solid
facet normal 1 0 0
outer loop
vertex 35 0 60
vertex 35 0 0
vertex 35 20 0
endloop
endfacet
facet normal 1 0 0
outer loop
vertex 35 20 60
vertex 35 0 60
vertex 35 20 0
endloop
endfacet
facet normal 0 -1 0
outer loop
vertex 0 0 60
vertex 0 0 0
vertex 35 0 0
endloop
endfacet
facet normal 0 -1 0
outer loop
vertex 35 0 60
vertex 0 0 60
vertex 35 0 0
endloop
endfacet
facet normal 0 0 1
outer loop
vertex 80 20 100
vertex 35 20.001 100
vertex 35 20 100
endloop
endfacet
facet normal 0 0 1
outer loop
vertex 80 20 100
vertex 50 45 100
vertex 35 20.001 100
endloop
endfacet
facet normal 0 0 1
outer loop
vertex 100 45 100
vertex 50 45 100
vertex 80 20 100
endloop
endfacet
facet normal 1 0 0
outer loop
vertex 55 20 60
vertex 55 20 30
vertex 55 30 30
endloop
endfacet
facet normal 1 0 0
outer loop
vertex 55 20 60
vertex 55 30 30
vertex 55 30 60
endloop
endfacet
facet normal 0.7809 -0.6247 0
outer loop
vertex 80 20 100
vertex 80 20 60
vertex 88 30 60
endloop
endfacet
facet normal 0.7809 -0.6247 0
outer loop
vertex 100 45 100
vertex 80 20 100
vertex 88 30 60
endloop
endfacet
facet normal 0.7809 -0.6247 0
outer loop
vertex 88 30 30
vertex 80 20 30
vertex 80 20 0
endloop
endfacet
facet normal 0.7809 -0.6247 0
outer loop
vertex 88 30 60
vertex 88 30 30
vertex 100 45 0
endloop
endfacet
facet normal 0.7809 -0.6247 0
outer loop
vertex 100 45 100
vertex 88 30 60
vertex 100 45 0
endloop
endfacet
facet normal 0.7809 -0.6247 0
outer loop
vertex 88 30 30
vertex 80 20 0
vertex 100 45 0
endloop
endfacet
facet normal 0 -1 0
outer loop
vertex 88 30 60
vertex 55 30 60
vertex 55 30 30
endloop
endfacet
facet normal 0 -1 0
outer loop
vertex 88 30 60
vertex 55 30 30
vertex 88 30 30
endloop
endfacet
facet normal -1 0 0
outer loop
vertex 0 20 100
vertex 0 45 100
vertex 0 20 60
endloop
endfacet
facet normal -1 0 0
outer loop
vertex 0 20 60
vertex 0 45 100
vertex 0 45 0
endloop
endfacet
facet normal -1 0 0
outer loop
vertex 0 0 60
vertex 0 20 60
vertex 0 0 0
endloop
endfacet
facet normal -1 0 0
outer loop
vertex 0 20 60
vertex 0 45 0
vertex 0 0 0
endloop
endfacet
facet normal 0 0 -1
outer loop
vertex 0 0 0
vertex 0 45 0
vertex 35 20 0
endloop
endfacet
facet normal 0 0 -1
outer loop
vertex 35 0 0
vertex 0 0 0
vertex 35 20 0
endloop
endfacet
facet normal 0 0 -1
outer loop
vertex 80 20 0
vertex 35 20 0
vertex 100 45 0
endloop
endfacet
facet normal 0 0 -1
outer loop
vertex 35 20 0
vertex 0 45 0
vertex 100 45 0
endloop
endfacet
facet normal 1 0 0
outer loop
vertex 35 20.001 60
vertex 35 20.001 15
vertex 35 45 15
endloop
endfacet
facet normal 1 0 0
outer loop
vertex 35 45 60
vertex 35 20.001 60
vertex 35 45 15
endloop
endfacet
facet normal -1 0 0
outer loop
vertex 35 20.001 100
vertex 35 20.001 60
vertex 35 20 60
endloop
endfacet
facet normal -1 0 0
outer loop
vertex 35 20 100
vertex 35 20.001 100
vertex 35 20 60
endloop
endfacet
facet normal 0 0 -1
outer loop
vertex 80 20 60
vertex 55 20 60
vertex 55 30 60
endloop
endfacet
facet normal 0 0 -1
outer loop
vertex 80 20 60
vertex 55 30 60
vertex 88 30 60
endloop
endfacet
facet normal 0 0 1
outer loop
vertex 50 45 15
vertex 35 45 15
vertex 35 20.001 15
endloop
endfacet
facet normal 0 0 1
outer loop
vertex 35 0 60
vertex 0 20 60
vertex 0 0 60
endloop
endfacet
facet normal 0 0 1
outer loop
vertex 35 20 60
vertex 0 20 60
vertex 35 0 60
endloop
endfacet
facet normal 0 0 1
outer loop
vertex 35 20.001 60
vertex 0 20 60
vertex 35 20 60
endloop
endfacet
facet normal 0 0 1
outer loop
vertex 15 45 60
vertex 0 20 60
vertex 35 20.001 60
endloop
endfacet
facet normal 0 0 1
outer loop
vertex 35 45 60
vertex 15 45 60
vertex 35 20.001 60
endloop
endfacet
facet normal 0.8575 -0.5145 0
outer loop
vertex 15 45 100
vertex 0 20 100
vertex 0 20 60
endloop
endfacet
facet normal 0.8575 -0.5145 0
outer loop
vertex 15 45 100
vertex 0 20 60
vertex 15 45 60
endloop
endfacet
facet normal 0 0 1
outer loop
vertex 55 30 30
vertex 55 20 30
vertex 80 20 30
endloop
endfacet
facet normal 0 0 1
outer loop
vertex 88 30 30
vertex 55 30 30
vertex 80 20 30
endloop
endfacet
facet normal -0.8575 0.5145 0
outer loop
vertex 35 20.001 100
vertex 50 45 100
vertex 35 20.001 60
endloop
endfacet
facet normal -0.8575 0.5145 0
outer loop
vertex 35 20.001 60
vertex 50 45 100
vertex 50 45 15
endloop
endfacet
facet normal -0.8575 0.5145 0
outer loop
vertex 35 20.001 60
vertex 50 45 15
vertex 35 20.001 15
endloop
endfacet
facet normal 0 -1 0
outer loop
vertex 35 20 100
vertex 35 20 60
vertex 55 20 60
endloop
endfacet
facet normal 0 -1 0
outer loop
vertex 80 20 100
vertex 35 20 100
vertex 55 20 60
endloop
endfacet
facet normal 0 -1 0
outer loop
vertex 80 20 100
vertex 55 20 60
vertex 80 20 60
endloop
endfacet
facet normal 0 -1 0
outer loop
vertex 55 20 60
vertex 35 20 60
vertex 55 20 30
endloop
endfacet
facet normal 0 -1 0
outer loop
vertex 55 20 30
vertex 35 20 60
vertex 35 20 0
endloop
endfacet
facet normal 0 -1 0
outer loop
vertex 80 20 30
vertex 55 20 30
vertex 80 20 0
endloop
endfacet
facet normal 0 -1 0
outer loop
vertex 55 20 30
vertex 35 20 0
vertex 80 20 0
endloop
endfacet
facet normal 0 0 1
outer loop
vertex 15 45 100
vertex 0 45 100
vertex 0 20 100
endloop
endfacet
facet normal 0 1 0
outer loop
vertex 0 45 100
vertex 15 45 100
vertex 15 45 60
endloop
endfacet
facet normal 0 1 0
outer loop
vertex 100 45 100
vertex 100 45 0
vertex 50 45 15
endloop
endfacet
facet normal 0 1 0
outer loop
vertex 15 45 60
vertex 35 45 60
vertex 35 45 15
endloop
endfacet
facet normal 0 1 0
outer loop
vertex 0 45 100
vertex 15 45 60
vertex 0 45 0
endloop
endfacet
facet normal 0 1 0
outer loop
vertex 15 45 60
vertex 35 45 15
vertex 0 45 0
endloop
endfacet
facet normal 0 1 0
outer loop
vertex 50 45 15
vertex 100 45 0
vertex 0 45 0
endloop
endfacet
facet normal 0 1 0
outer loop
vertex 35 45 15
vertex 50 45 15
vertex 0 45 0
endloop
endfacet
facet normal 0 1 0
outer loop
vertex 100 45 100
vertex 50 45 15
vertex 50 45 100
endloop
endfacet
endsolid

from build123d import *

# Parameters (mm, degrees)
F1_DEPTH = 60
F2_DEPTH = 15
F3_DEPTH = 100
F4_DEPTH = 100
F5_W     = 49.251026
F5_H     = 30
F6_DEPTH = 10


with BuildPart() as f1:
    # F0 (on Top) → F1 (new body)
    with BuildSketch(Plane.XY):
        Polygon((0, 45), (0, 20), (15, 45), align=None)
        Polygon((0, 20), (0, 0), (35, 0), (35, 20), (35, 20.001), (35, 45), (15, 45), align=None)
    extrude(amount=F1_DEPTH)

    # F0 (on Top) → F2 (join)
    with BuildSketch(Plane.XY):
        Polygon((35, 45), (35, 20.001), (50, 45), align=None)
    extrude(amount=F2_DEPTH)

    # F0 (on Top) → F3 (join)
    with BuildSketch(Plane.XY):
        Polygon((0, 45), (0, 20), (15, 45), align=None)
    extrude(amount=F3_DEPTH)

    # F0 (on Top) → F4 (join)
    with BuildSketch(Plane.XY):
        Polygon((35, 20.001), (35, 20), (80, 20), (100, 45), (50, 45), align=None)
    extrude(amount=F4_DEPTH)

    # F5 (on face) → F6 (cut)
    with BuildSketch(Plane.XZ.offset(-20)):
        with Locations((79.625513, 45)):
            Rectangle(F5_W, F5_H)
    extrude(amount=-F6_DEPTH, mode=Mode.SUBTRACT)


solid = f1.part
